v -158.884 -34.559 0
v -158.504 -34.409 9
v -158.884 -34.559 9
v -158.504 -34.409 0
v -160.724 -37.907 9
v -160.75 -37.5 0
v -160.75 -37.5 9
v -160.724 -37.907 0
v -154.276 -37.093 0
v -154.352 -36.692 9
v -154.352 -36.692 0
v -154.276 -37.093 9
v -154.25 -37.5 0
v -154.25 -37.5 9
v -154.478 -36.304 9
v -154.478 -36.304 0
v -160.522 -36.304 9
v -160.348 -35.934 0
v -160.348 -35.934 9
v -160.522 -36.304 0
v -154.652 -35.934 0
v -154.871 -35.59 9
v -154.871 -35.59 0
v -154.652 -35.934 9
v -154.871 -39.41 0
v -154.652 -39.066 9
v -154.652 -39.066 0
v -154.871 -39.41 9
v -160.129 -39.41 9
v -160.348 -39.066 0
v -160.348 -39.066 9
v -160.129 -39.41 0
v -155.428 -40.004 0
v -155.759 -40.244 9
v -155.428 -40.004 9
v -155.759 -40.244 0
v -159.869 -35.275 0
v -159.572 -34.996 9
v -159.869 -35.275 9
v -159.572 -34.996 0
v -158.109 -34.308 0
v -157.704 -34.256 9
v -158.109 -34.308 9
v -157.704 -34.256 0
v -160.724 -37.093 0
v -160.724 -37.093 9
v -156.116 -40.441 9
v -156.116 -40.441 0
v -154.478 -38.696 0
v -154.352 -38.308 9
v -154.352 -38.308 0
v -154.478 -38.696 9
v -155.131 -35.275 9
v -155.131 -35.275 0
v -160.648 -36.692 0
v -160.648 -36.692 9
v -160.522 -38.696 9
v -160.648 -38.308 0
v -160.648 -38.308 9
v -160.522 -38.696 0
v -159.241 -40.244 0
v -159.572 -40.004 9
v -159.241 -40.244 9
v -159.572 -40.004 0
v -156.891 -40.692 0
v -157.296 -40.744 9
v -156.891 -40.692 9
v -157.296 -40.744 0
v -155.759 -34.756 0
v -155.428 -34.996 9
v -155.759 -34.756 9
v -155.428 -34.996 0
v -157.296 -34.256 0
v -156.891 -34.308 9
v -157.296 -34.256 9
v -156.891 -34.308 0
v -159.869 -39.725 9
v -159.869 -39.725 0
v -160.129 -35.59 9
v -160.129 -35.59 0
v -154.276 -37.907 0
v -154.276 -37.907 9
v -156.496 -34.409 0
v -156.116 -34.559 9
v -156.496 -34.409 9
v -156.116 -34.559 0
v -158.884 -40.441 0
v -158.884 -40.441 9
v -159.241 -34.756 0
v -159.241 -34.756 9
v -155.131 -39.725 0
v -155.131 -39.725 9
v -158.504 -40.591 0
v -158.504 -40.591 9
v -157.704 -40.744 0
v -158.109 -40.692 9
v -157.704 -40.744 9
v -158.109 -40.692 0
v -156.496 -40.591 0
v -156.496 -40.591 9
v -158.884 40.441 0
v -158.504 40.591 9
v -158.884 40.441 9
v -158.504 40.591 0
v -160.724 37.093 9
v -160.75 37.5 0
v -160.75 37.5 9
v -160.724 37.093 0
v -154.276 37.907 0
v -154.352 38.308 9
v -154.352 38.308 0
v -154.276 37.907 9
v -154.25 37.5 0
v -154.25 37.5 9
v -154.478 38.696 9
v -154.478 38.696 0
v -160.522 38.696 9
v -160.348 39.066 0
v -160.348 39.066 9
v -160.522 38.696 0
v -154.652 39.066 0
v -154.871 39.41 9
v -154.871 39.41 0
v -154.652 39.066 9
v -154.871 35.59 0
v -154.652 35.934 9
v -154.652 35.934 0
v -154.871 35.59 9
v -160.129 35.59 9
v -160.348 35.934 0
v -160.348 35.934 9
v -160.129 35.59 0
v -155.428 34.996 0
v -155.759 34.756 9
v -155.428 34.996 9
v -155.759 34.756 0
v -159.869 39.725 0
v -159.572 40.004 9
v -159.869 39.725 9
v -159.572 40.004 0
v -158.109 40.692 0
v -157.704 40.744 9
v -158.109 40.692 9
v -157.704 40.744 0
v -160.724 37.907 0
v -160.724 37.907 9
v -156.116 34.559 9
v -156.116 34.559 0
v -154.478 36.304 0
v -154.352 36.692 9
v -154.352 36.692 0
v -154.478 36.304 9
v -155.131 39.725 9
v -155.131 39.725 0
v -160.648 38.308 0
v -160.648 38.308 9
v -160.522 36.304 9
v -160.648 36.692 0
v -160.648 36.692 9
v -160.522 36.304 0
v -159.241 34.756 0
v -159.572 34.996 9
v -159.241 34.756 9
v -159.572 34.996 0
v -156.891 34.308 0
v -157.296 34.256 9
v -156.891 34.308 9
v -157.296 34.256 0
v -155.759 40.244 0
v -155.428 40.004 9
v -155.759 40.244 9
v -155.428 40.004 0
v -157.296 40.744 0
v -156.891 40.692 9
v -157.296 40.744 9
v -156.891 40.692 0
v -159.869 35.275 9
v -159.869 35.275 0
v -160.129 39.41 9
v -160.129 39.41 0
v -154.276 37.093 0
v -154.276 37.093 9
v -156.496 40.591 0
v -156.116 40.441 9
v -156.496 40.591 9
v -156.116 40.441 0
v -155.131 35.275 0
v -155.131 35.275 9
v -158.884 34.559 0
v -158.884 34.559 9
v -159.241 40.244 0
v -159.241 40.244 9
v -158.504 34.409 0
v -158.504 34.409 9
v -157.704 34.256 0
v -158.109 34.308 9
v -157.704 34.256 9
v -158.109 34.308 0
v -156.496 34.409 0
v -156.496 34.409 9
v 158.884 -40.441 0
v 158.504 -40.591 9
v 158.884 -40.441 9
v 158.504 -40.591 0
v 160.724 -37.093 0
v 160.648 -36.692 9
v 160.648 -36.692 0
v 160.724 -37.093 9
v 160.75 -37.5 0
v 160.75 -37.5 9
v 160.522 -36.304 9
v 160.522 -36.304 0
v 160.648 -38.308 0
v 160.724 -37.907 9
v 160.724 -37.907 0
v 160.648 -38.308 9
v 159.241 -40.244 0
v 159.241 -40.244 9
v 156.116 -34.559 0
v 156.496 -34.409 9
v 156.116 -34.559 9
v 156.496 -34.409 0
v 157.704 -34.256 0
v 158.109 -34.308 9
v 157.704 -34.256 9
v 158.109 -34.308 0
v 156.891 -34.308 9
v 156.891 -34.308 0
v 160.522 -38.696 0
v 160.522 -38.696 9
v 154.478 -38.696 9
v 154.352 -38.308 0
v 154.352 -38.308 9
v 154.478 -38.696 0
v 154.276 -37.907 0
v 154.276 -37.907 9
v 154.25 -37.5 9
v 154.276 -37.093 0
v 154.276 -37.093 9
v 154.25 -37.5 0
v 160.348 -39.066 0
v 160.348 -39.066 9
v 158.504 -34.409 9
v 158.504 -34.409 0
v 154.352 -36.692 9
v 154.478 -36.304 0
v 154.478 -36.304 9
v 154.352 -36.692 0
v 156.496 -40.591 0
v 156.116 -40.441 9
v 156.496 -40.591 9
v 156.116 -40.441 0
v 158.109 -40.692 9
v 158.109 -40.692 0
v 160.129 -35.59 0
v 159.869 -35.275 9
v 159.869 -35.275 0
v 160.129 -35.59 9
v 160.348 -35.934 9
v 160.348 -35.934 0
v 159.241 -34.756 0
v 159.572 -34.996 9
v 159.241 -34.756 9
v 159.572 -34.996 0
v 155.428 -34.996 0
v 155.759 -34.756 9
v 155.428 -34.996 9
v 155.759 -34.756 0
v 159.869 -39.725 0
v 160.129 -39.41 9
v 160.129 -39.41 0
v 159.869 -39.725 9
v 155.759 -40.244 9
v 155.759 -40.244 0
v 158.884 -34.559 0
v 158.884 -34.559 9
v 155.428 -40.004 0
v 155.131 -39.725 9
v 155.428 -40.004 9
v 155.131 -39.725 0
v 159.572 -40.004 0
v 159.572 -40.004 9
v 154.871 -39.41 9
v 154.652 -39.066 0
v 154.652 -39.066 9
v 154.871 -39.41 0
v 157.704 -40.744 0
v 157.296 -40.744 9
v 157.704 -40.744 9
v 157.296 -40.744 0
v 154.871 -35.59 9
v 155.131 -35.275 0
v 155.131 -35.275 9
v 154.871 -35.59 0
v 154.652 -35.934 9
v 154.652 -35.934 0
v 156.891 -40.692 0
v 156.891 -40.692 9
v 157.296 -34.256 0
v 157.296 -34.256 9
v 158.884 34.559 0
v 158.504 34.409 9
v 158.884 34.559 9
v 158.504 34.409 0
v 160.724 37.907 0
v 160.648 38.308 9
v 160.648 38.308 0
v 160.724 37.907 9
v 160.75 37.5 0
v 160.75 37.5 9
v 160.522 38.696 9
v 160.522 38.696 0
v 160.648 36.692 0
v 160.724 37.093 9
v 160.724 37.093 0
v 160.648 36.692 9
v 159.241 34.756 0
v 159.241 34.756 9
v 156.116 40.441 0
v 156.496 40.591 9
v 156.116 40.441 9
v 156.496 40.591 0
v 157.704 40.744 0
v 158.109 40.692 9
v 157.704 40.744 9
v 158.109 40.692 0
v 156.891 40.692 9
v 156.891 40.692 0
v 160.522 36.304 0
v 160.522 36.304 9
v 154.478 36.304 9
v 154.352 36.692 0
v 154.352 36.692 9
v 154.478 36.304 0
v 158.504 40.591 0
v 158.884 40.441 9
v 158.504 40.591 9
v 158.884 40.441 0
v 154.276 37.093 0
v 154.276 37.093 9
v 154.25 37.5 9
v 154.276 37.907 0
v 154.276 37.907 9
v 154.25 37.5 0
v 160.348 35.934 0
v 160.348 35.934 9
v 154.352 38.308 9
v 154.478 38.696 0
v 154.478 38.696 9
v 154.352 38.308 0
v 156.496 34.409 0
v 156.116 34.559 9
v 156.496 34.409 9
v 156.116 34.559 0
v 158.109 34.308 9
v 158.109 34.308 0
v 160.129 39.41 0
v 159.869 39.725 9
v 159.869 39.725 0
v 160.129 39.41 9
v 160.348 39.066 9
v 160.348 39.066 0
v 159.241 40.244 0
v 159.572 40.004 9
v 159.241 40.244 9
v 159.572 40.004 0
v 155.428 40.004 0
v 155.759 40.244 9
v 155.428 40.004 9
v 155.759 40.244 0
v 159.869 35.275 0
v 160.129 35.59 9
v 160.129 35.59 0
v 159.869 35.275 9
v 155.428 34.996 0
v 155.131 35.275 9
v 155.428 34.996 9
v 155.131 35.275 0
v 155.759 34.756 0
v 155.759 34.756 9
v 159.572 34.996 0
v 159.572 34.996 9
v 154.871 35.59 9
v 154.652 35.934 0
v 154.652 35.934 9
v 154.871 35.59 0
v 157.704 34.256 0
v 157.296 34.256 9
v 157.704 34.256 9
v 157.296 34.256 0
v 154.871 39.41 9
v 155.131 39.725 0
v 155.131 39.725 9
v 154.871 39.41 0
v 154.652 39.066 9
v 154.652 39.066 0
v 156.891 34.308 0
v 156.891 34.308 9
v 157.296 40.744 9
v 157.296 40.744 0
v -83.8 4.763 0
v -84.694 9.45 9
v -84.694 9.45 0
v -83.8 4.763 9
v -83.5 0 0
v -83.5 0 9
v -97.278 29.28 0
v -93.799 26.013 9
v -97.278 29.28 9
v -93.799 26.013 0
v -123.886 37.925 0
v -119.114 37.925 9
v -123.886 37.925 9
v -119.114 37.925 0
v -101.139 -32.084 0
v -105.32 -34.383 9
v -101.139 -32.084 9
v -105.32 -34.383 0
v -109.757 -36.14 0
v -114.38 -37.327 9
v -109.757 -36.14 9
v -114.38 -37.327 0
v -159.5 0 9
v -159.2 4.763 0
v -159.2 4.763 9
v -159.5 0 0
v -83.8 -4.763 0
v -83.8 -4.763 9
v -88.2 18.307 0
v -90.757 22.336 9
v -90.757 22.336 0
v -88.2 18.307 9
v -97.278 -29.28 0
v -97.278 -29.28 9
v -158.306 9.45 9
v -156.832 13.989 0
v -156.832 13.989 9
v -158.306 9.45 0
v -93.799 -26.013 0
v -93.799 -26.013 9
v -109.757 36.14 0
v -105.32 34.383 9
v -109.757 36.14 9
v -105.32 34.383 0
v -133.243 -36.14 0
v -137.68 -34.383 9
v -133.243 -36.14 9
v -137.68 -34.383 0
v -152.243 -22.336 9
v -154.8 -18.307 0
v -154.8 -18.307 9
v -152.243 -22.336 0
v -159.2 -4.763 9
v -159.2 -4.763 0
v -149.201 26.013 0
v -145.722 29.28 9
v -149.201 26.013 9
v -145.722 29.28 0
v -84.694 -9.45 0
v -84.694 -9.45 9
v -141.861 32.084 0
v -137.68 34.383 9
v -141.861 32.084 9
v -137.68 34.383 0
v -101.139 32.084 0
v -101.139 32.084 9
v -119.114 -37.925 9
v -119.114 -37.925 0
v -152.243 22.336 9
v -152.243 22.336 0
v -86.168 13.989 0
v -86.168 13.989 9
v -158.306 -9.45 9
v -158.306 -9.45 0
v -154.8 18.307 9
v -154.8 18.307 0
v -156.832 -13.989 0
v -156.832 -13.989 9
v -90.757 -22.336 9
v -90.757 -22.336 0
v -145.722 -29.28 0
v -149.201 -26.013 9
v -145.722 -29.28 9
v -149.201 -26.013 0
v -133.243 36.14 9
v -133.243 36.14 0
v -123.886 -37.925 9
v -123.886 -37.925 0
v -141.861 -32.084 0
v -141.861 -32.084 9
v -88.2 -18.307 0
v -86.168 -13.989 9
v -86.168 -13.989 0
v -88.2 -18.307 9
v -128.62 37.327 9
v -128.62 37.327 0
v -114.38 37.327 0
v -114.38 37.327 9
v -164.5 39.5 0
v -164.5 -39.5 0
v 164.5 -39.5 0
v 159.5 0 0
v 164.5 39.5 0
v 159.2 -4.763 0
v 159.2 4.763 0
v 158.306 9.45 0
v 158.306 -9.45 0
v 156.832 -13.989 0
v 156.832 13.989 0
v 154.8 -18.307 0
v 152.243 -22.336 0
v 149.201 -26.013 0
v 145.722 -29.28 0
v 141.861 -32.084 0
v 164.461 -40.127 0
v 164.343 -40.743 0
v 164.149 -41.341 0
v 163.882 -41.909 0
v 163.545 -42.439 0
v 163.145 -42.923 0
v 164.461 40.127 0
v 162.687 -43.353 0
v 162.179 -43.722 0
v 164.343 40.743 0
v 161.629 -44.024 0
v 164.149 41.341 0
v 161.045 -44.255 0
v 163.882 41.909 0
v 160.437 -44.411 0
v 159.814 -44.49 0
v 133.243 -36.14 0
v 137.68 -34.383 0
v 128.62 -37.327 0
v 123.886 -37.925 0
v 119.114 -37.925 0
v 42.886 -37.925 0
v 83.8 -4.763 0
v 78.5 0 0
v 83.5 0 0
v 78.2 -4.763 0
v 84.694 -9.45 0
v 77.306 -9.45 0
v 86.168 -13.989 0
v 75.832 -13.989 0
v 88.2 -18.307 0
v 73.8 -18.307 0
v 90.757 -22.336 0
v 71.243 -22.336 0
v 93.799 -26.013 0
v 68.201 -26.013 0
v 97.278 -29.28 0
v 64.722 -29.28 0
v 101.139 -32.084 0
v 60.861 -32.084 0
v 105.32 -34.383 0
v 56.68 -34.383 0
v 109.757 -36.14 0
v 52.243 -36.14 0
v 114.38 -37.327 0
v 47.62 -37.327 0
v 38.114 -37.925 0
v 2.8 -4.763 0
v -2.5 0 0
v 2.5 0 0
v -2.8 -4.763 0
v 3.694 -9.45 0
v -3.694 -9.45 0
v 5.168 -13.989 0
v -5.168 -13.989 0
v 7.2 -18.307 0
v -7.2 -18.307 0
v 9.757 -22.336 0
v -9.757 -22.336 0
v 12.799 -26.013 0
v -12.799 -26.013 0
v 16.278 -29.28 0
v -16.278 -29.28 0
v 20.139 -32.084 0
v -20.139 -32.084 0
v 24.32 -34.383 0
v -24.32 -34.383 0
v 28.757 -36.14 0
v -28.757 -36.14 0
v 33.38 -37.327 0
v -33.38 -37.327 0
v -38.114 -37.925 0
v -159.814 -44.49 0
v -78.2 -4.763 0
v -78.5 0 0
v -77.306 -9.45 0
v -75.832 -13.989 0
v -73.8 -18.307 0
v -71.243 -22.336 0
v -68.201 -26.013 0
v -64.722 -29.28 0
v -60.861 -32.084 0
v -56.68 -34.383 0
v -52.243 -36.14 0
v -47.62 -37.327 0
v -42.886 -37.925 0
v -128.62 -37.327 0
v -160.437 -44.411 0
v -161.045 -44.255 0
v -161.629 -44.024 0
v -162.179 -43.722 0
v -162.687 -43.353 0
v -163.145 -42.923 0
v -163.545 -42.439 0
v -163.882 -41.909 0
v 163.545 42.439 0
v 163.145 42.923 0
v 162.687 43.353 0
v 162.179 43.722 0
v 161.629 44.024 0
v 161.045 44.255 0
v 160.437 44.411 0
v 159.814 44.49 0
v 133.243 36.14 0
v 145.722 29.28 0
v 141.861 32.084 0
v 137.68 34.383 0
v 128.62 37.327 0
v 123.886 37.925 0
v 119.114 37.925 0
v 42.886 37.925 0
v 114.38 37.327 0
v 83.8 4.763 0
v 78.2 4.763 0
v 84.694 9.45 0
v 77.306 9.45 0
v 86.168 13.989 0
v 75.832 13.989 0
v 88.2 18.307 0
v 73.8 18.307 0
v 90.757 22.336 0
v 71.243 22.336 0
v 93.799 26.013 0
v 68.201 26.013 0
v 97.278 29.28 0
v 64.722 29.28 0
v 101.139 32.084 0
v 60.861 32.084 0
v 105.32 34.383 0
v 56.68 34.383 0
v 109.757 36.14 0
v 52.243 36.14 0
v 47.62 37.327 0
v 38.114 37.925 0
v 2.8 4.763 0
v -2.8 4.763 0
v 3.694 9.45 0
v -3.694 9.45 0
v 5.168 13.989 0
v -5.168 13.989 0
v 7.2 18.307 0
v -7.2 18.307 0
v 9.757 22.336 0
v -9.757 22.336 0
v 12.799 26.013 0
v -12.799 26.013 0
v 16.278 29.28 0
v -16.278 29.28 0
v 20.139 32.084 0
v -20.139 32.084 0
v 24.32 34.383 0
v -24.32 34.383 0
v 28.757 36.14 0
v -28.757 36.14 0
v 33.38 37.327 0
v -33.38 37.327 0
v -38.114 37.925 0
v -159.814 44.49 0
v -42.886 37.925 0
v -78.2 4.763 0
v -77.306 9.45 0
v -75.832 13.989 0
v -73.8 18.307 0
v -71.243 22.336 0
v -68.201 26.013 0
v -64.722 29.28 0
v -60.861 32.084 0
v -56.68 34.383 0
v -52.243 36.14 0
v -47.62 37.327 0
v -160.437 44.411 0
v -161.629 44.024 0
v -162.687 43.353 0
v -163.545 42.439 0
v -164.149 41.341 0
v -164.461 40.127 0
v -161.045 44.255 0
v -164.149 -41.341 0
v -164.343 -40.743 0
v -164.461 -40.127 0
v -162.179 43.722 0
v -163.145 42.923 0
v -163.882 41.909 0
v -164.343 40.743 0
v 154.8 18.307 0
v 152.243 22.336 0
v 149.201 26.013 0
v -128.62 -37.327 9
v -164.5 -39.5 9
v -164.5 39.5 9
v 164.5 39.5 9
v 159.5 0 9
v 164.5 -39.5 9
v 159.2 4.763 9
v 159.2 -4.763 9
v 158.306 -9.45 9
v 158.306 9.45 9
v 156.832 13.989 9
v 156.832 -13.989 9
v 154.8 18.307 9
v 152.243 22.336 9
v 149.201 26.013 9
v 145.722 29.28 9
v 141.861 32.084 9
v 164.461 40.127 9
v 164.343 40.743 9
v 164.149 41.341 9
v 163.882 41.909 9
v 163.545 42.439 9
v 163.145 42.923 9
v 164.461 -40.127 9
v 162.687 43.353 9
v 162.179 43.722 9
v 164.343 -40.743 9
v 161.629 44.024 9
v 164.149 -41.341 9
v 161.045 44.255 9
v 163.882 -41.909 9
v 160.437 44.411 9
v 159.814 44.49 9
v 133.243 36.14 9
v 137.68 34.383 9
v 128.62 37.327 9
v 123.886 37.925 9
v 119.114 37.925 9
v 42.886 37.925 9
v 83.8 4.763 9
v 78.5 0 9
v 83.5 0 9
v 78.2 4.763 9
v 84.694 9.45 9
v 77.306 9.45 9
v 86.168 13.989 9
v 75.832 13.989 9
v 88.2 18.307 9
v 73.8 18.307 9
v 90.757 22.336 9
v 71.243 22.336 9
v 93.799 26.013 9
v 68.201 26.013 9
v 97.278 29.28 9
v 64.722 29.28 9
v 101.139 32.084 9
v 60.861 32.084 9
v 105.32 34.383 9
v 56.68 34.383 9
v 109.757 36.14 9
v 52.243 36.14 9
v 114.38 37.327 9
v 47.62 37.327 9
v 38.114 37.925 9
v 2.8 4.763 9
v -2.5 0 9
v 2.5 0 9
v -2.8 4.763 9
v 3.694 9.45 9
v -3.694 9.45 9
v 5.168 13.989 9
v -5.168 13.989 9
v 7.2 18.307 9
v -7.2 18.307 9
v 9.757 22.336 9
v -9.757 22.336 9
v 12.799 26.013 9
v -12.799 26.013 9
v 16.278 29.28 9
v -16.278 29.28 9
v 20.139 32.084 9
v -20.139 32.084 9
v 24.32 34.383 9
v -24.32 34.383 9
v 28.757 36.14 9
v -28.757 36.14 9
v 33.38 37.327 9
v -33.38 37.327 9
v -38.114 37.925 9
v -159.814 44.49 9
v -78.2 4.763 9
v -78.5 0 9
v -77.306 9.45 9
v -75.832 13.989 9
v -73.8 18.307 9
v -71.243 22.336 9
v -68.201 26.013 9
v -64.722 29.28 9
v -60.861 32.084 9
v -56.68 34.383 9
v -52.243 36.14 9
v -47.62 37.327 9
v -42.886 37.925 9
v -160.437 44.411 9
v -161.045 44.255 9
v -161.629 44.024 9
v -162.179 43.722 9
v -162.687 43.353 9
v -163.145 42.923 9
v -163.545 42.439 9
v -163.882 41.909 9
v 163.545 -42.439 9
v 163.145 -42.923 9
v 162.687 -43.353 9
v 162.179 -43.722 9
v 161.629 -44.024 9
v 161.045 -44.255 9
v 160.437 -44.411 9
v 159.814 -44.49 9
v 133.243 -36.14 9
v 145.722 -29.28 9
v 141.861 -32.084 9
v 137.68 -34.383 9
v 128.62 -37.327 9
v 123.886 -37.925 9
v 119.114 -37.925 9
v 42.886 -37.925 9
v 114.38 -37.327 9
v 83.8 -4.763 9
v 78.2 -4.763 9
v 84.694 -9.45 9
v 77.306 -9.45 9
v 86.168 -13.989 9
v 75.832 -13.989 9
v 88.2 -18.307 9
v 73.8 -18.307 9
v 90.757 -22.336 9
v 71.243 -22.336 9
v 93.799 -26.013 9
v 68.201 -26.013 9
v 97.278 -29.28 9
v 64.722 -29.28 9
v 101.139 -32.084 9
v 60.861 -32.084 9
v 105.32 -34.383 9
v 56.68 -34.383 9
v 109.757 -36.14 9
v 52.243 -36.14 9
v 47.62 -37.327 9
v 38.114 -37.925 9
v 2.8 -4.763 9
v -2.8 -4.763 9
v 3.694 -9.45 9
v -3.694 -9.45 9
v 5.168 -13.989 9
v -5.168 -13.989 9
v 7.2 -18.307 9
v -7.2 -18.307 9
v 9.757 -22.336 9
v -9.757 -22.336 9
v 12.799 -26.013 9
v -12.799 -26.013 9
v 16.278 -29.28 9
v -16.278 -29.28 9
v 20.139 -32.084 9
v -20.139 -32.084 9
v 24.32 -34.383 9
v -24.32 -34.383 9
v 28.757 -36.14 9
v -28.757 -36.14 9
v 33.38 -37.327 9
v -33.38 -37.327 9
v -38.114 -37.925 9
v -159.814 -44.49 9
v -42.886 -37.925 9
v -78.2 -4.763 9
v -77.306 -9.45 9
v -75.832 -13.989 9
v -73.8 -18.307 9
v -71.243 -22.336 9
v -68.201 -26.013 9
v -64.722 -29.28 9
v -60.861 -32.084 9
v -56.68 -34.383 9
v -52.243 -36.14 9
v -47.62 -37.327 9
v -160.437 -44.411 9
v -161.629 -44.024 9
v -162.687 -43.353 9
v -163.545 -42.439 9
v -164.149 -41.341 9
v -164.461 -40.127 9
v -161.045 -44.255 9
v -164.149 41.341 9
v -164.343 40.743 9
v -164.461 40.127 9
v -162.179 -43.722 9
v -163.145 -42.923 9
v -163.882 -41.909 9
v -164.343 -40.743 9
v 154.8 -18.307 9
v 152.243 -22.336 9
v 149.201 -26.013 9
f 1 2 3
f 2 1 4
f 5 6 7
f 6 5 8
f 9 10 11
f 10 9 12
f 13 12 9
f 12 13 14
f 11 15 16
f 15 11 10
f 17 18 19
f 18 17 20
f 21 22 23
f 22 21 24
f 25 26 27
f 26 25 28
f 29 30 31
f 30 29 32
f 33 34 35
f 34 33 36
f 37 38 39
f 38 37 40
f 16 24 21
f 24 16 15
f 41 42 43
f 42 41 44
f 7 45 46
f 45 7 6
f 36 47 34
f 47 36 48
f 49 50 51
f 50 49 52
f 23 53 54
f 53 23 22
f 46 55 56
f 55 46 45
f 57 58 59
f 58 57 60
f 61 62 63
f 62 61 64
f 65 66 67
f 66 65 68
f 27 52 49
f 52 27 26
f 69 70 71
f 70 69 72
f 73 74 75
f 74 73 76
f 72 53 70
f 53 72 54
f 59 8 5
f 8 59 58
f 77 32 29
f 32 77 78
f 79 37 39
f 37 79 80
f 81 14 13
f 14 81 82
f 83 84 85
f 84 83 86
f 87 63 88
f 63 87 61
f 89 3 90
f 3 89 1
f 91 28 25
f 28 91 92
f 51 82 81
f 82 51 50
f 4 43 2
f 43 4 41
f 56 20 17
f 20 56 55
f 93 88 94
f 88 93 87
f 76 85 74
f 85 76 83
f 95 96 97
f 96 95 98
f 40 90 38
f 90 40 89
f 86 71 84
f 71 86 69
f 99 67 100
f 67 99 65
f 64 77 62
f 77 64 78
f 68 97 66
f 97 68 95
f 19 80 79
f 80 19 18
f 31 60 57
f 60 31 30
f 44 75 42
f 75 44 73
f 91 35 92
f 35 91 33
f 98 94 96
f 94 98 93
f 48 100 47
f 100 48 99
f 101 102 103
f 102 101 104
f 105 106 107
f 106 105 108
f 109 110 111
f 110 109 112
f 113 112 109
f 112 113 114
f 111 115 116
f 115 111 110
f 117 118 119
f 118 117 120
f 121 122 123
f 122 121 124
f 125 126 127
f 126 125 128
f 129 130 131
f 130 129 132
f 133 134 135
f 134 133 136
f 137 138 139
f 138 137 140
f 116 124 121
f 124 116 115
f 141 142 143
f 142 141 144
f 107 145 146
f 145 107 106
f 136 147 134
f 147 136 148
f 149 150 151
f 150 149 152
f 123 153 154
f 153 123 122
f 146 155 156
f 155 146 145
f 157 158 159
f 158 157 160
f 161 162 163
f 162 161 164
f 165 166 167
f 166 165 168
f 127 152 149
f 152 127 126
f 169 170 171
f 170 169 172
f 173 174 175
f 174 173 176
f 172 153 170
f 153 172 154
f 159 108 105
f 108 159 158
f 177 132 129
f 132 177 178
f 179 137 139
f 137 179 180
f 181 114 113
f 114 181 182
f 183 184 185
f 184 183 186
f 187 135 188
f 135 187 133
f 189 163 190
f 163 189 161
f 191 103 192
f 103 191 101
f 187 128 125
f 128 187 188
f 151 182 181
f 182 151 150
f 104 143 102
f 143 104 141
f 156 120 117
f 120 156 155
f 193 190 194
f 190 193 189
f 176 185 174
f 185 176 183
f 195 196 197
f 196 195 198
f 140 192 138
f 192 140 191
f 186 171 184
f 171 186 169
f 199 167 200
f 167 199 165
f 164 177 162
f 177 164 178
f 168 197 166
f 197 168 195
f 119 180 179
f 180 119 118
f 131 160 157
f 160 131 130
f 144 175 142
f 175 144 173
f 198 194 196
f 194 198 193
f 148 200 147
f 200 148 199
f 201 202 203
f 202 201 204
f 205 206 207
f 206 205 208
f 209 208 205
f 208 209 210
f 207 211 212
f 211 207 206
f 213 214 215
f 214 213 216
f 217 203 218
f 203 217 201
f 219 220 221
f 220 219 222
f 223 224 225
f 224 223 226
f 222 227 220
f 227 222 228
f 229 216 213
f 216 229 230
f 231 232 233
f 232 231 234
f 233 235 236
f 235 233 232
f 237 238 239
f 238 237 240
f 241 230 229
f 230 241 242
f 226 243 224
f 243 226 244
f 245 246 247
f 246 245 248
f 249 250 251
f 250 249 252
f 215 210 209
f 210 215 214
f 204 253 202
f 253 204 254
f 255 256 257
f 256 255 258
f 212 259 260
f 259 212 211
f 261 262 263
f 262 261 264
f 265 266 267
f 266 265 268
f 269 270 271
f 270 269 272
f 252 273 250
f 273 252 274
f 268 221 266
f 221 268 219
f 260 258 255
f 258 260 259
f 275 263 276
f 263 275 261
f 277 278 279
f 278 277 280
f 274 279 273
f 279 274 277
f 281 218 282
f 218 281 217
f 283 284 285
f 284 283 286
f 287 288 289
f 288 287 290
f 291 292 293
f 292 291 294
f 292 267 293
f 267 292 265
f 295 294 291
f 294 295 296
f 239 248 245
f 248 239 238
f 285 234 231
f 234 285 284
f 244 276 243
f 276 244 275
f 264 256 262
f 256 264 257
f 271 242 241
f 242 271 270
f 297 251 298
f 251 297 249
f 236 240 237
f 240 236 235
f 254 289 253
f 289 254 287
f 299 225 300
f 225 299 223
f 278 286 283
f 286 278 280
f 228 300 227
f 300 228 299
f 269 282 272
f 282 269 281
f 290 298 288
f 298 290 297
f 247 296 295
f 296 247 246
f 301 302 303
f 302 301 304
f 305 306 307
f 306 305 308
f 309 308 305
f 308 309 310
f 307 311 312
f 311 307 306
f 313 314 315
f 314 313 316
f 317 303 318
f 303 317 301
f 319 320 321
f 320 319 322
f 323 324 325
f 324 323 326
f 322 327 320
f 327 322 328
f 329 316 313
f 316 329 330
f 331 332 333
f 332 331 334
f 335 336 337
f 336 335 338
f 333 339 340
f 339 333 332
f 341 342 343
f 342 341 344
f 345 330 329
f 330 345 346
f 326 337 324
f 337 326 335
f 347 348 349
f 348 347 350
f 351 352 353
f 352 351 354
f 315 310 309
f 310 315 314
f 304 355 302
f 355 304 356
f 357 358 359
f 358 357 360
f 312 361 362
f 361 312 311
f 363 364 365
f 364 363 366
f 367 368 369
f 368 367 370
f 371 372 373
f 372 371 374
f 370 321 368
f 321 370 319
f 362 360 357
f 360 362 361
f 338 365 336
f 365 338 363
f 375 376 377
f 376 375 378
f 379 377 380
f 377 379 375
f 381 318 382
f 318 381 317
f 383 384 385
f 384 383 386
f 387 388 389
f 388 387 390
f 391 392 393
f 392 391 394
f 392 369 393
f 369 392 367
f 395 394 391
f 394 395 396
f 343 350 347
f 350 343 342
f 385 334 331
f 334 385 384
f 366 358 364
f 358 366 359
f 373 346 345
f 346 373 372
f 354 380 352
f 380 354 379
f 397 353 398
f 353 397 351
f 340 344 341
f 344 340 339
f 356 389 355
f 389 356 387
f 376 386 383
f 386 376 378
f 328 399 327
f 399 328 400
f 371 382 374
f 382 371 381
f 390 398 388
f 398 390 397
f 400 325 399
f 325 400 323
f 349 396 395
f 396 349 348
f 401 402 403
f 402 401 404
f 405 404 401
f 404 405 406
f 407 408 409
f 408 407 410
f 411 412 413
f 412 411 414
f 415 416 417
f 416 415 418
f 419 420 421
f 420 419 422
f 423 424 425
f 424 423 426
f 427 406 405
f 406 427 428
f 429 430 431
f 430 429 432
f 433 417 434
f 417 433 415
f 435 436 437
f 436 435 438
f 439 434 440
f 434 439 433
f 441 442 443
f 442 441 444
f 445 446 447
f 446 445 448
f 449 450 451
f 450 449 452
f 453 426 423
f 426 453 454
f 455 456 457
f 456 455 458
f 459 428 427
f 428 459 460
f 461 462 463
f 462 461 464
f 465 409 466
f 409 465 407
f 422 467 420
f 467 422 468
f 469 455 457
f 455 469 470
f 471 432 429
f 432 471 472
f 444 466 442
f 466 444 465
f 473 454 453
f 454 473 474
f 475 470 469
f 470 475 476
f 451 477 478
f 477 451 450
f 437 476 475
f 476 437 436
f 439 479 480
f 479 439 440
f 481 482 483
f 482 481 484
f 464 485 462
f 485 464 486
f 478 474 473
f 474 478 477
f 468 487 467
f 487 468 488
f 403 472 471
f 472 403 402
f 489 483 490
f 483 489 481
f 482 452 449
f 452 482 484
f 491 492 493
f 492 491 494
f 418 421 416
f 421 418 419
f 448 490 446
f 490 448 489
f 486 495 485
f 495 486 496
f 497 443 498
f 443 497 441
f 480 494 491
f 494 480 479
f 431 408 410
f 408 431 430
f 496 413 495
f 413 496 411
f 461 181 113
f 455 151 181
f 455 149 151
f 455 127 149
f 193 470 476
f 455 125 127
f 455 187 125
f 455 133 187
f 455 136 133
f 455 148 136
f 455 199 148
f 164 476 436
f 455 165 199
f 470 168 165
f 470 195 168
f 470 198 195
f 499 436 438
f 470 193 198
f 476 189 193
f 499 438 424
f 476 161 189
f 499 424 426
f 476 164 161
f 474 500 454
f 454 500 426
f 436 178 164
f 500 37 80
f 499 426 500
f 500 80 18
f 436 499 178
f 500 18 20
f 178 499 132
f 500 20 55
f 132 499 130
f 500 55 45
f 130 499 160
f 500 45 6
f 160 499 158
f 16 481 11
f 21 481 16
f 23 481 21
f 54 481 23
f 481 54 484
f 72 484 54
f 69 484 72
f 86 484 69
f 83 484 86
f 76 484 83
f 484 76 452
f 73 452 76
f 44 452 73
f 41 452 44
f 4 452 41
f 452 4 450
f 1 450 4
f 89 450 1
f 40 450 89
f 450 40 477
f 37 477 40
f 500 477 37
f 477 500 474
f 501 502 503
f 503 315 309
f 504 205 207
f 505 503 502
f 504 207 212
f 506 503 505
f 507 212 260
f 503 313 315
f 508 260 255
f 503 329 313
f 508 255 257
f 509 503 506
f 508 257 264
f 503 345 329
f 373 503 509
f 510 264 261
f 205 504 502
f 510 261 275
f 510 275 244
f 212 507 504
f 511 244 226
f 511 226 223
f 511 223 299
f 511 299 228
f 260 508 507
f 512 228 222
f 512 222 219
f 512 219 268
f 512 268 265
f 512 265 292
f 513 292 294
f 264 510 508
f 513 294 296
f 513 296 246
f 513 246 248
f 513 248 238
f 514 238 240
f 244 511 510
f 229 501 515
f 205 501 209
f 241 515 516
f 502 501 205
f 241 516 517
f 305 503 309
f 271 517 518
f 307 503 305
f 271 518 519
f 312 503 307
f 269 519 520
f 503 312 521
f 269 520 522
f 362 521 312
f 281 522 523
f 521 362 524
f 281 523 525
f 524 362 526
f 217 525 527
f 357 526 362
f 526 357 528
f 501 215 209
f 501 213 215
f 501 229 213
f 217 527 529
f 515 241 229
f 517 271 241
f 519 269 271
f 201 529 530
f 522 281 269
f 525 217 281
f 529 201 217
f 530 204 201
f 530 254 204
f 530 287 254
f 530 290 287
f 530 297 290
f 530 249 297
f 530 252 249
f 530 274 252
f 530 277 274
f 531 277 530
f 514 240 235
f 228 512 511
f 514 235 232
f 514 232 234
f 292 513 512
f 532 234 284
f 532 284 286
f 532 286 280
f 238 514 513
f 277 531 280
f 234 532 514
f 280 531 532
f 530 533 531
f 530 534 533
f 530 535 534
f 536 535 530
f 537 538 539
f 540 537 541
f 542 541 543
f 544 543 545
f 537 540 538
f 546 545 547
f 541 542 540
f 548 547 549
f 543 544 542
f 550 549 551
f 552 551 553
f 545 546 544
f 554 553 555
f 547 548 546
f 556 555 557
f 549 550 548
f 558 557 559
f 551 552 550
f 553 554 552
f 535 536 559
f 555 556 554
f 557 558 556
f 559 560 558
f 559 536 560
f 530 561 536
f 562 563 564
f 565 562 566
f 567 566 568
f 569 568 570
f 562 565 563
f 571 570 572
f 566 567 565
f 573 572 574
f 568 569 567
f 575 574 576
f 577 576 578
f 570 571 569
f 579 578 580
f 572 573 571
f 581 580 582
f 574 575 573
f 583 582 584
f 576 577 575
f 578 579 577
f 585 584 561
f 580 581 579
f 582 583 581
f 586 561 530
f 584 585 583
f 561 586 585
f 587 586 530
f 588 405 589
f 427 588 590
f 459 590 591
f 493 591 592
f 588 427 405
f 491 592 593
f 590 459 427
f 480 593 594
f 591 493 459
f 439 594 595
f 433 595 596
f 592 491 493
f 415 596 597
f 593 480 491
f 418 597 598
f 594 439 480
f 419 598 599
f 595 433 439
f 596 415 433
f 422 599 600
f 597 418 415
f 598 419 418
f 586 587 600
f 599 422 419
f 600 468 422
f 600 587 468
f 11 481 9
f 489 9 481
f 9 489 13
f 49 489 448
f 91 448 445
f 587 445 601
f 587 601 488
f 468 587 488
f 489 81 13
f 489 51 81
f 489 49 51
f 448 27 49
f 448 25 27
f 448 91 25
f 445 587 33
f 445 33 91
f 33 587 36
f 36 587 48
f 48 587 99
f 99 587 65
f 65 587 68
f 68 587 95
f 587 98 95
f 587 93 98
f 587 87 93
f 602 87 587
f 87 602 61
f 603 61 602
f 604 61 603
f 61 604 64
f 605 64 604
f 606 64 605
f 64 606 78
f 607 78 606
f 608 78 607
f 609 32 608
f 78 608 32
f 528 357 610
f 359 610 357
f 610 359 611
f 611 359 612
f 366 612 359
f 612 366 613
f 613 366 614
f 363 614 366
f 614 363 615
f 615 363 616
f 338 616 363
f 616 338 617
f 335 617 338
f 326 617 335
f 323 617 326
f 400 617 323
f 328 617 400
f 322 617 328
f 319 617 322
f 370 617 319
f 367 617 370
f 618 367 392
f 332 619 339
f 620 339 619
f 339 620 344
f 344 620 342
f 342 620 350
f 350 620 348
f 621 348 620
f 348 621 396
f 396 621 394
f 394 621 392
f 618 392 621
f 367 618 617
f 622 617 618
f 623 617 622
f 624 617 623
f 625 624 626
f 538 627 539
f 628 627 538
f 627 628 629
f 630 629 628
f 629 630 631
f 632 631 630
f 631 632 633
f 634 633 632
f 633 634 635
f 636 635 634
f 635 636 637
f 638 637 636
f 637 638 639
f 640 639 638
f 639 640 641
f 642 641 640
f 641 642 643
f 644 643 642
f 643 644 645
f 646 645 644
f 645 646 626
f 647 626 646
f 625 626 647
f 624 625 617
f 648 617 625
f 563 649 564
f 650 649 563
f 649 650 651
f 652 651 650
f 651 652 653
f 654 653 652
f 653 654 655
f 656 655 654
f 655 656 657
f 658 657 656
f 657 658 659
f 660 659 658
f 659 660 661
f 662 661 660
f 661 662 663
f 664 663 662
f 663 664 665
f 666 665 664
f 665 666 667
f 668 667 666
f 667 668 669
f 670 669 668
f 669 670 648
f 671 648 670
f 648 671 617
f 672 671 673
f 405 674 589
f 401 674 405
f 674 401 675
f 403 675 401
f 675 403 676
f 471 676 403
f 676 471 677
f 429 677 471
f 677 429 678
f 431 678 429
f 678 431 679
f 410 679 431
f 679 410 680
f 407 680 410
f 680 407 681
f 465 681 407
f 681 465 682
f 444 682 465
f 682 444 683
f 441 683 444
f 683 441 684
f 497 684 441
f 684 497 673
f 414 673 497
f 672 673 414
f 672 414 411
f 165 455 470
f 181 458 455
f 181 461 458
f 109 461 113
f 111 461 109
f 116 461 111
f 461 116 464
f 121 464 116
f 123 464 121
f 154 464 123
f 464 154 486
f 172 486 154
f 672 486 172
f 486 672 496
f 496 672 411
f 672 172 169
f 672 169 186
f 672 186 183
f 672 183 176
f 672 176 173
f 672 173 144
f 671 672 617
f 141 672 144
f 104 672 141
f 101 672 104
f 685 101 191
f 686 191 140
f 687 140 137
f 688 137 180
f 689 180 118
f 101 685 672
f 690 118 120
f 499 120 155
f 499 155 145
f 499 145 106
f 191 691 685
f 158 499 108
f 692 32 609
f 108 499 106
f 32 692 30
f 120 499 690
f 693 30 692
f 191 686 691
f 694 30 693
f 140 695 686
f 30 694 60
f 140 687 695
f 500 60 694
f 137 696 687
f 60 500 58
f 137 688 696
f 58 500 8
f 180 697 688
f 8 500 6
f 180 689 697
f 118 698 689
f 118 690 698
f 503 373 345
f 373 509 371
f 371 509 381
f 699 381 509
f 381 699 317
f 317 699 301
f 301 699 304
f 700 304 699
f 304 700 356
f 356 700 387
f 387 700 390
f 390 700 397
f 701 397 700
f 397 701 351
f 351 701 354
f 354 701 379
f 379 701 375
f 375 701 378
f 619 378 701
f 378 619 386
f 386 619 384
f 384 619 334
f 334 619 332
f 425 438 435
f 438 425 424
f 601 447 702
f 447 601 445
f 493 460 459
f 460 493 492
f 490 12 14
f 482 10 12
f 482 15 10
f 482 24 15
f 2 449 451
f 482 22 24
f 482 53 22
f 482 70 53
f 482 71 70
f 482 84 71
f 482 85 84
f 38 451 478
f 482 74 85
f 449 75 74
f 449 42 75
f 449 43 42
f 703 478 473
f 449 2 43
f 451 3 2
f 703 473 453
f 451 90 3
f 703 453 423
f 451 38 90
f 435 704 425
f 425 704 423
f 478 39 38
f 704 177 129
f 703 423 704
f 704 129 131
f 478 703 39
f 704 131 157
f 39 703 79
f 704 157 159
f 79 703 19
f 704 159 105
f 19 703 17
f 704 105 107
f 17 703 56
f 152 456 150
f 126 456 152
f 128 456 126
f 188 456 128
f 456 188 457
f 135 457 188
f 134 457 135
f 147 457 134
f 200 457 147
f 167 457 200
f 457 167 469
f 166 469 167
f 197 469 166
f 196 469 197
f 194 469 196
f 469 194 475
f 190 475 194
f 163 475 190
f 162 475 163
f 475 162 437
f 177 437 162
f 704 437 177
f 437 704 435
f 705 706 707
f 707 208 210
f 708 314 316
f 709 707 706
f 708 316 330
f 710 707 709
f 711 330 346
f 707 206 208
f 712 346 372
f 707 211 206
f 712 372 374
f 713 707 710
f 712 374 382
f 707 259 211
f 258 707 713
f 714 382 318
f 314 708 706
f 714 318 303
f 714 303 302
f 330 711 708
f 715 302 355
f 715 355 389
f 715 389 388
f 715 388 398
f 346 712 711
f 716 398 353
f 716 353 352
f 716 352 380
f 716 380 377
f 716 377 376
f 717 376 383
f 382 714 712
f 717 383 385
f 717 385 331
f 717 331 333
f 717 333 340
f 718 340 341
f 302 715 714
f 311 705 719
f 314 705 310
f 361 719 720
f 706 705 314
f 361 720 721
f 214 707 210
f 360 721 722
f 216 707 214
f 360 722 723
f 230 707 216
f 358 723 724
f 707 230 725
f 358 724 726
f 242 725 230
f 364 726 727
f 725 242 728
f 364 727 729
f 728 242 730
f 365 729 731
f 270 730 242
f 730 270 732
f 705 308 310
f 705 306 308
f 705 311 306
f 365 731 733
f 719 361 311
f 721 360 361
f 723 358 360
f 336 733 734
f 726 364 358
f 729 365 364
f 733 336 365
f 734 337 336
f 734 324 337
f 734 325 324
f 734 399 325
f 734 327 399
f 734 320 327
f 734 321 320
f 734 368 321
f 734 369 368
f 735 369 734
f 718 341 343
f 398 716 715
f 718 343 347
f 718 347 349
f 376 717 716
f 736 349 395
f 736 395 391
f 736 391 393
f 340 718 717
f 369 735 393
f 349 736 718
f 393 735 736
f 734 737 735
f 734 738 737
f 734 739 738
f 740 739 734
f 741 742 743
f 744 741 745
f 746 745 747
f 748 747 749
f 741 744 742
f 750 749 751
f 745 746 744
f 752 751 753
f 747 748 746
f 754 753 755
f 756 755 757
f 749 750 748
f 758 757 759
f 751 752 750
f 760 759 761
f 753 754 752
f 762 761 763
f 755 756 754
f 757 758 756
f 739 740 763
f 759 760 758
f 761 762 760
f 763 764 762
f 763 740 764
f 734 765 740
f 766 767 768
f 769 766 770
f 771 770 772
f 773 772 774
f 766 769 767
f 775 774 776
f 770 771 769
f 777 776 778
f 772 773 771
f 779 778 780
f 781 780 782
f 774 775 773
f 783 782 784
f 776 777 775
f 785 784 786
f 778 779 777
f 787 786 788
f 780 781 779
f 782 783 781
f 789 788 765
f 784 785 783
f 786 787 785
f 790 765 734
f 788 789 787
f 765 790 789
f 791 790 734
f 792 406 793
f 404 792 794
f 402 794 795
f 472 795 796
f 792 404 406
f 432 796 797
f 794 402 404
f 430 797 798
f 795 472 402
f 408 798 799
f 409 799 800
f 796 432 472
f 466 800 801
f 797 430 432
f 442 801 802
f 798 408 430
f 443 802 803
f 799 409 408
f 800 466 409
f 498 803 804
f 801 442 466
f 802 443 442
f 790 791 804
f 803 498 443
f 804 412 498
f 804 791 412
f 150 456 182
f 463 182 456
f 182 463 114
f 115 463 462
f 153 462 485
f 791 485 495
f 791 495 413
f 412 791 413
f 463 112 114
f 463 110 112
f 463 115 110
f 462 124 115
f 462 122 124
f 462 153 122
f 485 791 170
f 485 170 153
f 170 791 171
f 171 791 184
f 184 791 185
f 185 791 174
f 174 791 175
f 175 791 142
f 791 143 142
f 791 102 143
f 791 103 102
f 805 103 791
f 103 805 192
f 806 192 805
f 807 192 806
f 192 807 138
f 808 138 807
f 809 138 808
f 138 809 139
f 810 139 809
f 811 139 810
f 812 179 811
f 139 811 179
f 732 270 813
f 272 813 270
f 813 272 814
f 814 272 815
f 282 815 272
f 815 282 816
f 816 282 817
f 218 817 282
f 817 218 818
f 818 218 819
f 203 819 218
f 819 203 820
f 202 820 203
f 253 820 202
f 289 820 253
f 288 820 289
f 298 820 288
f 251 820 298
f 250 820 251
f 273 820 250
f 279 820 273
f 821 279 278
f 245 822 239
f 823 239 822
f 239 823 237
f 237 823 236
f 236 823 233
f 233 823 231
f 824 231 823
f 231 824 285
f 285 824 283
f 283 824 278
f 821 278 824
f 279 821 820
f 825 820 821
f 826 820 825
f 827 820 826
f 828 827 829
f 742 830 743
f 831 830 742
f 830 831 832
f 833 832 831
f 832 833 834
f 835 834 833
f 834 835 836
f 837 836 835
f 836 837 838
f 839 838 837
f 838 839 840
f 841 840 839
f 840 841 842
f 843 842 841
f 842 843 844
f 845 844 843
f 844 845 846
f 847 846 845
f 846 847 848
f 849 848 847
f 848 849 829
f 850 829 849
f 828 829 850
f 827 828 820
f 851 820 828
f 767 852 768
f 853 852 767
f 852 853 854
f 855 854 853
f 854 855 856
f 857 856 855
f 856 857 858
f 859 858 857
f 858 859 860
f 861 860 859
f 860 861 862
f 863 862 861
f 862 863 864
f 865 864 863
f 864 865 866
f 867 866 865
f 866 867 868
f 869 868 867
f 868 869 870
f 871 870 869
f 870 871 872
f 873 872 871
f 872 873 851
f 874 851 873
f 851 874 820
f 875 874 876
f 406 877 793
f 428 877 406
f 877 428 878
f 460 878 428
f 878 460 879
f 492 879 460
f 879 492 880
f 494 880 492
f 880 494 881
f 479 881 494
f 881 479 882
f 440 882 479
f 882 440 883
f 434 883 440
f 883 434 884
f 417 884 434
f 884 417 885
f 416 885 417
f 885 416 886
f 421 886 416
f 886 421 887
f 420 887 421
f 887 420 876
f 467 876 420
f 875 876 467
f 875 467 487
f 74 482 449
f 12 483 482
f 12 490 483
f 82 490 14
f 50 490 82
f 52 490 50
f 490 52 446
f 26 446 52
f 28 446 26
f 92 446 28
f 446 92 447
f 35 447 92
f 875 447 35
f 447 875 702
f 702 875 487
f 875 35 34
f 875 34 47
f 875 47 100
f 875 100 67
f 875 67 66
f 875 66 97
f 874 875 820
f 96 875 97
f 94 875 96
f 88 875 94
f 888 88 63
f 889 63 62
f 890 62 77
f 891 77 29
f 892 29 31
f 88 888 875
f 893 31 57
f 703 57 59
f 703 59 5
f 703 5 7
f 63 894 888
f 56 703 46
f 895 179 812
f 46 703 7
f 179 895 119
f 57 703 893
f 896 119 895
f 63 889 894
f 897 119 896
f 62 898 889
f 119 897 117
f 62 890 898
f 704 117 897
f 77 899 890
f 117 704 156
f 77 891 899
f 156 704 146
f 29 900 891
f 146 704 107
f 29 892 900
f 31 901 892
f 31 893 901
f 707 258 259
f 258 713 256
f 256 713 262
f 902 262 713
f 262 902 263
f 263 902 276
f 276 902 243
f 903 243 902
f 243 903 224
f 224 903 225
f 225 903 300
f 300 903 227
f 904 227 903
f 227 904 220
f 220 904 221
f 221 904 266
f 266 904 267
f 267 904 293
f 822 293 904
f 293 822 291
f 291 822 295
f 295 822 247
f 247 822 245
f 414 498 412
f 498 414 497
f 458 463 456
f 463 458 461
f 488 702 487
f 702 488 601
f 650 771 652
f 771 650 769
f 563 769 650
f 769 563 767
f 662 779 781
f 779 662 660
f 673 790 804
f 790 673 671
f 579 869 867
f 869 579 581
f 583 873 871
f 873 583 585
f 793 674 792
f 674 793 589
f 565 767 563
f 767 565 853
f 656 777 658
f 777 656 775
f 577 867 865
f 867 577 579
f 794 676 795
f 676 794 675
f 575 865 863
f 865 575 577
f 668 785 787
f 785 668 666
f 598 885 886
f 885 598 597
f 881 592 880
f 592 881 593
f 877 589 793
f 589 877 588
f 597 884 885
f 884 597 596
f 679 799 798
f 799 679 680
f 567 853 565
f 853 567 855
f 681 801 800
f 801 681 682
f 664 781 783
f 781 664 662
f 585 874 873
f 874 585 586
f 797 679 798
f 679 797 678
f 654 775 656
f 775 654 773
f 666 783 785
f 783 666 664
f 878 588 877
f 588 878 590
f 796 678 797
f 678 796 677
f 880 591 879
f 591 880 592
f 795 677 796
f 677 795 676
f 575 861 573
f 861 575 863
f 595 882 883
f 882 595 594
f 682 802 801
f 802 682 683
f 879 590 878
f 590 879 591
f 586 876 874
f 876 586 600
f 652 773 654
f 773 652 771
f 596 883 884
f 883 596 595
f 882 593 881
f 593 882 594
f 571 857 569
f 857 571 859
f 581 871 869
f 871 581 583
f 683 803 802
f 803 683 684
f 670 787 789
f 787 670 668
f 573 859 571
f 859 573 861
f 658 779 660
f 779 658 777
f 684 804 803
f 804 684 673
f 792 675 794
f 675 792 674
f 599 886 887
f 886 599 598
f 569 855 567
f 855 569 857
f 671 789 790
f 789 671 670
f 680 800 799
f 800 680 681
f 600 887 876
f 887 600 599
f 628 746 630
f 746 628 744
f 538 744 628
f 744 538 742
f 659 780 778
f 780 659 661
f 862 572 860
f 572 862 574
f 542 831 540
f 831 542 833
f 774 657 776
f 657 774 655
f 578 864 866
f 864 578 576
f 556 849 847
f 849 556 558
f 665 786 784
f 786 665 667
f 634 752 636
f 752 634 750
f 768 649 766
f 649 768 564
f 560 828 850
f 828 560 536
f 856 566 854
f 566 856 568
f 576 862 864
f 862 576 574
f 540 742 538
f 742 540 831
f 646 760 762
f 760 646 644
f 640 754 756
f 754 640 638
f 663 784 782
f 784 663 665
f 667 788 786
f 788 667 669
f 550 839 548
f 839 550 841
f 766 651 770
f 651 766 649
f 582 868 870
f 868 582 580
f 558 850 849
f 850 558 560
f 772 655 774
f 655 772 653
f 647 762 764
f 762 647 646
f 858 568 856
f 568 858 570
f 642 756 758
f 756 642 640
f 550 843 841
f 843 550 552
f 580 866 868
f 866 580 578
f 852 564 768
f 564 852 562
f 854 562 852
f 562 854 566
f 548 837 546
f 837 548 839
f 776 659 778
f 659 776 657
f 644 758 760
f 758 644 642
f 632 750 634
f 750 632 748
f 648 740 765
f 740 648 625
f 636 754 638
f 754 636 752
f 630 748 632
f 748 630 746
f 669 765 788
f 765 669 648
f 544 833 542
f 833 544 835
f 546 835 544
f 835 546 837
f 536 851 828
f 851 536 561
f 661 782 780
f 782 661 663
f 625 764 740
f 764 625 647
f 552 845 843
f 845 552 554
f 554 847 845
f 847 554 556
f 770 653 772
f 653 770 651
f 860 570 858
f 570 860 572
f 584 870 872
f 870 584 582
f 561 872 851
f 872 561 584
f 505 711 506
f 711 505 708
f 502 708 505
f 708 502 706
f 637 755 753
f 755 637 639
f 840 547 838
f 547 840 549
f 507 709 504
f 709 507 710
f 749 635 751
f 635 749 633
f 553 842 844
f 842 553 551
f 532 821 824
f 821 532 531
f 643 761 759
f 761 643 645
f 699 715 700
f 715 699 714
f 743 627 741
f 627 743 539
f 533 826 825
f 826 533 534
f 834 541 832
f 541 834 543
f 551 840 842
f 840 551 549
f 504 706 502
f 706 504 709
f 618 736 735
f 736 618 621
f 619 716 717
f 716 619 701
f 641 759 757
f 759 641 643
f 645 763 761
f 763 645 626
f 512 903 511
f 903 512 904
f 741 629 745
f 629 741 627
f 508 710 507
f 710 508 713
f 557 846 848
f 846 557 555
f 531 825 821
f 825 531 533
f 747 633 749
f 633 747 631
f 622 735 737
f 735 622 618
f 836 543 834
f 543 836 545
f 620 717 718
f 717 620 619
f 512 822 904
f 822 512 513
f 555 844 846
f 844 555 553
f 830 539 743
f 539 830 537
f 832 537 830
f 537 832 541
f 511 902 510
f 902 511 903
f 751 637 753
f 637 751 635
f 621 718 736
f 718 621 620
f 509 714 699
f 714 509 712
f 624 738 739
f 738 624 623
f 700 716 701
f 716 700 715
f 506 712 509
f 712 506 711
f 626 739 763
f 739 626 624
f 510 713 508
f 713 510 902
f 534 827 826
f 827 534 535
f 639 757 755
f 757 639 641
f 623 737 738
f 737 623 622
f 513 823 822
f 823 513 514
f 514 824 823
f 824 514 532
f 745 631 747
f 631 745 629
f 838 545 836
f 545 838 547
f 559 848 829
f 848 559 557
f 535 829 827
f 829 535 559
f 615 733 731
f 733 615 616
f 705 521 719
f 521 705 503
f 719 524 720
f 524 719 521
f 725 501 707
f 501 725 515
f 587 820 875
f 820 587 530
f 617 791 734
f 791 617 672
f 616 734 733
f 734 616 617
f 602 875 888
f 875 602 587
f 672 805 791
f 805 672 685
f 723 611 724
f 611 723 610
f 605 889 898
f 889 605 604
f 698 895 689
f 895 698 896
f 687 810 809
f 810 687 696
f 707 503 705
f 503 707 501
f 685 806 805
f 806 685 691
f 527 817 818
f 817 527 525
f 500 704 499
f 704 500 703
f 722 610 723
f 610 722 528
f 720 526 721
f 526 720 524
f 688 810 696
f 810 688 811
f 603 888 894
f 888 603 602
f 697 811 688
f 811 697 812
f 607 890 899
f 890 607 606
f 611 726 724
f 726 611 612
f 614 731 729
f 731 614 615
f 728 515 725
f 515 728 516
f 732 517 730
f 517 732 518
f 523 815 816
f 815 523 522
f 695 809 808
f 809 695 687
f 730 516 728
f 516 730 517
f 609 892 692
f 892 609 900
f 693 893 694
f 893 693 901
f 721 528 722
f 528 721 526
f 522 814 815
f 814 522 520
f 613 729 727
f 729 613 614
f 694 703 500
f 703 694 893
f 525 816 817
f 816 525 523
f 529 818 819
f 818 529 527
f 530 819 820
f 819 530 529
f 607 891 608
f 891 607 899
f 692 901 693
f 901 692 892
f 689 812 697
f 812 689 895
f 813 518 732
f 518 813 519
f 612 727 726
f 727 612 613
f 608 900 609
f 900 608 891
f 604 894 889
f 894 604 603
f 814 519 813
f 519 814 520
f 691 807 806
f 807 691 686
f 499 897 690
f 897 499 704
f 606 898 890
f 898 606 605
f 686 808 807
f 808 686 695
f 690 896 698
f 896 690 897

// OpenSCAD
$fn = 50;


difference() {
	union() {
		hull() {
			translate(v = [-159.5000000000, 39.5000000000, 0]) {
				cylinder(h = 9, r = 5);
			}
			translate(v = [159.5000000000, 39.5000000000, 0]) {
				cylinder(h = 9, r = 5);
			}
			translate(v = [-159.5000000000, -39.5000000000, 0]) {
				cylinder(h = 9, r = 5);
			}
			translate(v = [159.5000000000, -39.5000000000, 0]) {
				cylinder(h = 9, r = 5);
			}
		}
	}
	union() {
		#translate(v = [-157.5000000000, -37.5000000000, -100.0000000000]) {
			cylinder(h = 200, r = 3.2500000000);
		}
		#translate(v = [-157.5000000000, 37.5000000000, -100.0000000000]) {
			cylinder(h = 200, r = 3.2500000000);
		}
		#translate(v = [157.5000000000, -37.5000000000, -100.0000000000]) {
			cylinder(h = 200, r = 3.2500000000);
		}
		#translate(v = [157.5000000000, 37.5000000000, -100.0000000000]) {
			cylinder(h = 200, r = 3.2500000000);
		}
		#translate(v = [-121.5000000000, 0, 0]) {
			cylinder(h = 9, r = 38.0000000000);
		}
		#translate(v = [-40.5000000000, 0, 0]) {
			cylinder(h = 9, r = 38.0000000000);
		}
		#translate(v = [40.5000000000, 0, 0]) {
			cylinder(h = 9, r = 38.0000000000);
		}
		#translate(v = [121.5000000000, 0, 0]) {
			cylinder(h = 9, r = 38.0000000000);
		}
	}
}
